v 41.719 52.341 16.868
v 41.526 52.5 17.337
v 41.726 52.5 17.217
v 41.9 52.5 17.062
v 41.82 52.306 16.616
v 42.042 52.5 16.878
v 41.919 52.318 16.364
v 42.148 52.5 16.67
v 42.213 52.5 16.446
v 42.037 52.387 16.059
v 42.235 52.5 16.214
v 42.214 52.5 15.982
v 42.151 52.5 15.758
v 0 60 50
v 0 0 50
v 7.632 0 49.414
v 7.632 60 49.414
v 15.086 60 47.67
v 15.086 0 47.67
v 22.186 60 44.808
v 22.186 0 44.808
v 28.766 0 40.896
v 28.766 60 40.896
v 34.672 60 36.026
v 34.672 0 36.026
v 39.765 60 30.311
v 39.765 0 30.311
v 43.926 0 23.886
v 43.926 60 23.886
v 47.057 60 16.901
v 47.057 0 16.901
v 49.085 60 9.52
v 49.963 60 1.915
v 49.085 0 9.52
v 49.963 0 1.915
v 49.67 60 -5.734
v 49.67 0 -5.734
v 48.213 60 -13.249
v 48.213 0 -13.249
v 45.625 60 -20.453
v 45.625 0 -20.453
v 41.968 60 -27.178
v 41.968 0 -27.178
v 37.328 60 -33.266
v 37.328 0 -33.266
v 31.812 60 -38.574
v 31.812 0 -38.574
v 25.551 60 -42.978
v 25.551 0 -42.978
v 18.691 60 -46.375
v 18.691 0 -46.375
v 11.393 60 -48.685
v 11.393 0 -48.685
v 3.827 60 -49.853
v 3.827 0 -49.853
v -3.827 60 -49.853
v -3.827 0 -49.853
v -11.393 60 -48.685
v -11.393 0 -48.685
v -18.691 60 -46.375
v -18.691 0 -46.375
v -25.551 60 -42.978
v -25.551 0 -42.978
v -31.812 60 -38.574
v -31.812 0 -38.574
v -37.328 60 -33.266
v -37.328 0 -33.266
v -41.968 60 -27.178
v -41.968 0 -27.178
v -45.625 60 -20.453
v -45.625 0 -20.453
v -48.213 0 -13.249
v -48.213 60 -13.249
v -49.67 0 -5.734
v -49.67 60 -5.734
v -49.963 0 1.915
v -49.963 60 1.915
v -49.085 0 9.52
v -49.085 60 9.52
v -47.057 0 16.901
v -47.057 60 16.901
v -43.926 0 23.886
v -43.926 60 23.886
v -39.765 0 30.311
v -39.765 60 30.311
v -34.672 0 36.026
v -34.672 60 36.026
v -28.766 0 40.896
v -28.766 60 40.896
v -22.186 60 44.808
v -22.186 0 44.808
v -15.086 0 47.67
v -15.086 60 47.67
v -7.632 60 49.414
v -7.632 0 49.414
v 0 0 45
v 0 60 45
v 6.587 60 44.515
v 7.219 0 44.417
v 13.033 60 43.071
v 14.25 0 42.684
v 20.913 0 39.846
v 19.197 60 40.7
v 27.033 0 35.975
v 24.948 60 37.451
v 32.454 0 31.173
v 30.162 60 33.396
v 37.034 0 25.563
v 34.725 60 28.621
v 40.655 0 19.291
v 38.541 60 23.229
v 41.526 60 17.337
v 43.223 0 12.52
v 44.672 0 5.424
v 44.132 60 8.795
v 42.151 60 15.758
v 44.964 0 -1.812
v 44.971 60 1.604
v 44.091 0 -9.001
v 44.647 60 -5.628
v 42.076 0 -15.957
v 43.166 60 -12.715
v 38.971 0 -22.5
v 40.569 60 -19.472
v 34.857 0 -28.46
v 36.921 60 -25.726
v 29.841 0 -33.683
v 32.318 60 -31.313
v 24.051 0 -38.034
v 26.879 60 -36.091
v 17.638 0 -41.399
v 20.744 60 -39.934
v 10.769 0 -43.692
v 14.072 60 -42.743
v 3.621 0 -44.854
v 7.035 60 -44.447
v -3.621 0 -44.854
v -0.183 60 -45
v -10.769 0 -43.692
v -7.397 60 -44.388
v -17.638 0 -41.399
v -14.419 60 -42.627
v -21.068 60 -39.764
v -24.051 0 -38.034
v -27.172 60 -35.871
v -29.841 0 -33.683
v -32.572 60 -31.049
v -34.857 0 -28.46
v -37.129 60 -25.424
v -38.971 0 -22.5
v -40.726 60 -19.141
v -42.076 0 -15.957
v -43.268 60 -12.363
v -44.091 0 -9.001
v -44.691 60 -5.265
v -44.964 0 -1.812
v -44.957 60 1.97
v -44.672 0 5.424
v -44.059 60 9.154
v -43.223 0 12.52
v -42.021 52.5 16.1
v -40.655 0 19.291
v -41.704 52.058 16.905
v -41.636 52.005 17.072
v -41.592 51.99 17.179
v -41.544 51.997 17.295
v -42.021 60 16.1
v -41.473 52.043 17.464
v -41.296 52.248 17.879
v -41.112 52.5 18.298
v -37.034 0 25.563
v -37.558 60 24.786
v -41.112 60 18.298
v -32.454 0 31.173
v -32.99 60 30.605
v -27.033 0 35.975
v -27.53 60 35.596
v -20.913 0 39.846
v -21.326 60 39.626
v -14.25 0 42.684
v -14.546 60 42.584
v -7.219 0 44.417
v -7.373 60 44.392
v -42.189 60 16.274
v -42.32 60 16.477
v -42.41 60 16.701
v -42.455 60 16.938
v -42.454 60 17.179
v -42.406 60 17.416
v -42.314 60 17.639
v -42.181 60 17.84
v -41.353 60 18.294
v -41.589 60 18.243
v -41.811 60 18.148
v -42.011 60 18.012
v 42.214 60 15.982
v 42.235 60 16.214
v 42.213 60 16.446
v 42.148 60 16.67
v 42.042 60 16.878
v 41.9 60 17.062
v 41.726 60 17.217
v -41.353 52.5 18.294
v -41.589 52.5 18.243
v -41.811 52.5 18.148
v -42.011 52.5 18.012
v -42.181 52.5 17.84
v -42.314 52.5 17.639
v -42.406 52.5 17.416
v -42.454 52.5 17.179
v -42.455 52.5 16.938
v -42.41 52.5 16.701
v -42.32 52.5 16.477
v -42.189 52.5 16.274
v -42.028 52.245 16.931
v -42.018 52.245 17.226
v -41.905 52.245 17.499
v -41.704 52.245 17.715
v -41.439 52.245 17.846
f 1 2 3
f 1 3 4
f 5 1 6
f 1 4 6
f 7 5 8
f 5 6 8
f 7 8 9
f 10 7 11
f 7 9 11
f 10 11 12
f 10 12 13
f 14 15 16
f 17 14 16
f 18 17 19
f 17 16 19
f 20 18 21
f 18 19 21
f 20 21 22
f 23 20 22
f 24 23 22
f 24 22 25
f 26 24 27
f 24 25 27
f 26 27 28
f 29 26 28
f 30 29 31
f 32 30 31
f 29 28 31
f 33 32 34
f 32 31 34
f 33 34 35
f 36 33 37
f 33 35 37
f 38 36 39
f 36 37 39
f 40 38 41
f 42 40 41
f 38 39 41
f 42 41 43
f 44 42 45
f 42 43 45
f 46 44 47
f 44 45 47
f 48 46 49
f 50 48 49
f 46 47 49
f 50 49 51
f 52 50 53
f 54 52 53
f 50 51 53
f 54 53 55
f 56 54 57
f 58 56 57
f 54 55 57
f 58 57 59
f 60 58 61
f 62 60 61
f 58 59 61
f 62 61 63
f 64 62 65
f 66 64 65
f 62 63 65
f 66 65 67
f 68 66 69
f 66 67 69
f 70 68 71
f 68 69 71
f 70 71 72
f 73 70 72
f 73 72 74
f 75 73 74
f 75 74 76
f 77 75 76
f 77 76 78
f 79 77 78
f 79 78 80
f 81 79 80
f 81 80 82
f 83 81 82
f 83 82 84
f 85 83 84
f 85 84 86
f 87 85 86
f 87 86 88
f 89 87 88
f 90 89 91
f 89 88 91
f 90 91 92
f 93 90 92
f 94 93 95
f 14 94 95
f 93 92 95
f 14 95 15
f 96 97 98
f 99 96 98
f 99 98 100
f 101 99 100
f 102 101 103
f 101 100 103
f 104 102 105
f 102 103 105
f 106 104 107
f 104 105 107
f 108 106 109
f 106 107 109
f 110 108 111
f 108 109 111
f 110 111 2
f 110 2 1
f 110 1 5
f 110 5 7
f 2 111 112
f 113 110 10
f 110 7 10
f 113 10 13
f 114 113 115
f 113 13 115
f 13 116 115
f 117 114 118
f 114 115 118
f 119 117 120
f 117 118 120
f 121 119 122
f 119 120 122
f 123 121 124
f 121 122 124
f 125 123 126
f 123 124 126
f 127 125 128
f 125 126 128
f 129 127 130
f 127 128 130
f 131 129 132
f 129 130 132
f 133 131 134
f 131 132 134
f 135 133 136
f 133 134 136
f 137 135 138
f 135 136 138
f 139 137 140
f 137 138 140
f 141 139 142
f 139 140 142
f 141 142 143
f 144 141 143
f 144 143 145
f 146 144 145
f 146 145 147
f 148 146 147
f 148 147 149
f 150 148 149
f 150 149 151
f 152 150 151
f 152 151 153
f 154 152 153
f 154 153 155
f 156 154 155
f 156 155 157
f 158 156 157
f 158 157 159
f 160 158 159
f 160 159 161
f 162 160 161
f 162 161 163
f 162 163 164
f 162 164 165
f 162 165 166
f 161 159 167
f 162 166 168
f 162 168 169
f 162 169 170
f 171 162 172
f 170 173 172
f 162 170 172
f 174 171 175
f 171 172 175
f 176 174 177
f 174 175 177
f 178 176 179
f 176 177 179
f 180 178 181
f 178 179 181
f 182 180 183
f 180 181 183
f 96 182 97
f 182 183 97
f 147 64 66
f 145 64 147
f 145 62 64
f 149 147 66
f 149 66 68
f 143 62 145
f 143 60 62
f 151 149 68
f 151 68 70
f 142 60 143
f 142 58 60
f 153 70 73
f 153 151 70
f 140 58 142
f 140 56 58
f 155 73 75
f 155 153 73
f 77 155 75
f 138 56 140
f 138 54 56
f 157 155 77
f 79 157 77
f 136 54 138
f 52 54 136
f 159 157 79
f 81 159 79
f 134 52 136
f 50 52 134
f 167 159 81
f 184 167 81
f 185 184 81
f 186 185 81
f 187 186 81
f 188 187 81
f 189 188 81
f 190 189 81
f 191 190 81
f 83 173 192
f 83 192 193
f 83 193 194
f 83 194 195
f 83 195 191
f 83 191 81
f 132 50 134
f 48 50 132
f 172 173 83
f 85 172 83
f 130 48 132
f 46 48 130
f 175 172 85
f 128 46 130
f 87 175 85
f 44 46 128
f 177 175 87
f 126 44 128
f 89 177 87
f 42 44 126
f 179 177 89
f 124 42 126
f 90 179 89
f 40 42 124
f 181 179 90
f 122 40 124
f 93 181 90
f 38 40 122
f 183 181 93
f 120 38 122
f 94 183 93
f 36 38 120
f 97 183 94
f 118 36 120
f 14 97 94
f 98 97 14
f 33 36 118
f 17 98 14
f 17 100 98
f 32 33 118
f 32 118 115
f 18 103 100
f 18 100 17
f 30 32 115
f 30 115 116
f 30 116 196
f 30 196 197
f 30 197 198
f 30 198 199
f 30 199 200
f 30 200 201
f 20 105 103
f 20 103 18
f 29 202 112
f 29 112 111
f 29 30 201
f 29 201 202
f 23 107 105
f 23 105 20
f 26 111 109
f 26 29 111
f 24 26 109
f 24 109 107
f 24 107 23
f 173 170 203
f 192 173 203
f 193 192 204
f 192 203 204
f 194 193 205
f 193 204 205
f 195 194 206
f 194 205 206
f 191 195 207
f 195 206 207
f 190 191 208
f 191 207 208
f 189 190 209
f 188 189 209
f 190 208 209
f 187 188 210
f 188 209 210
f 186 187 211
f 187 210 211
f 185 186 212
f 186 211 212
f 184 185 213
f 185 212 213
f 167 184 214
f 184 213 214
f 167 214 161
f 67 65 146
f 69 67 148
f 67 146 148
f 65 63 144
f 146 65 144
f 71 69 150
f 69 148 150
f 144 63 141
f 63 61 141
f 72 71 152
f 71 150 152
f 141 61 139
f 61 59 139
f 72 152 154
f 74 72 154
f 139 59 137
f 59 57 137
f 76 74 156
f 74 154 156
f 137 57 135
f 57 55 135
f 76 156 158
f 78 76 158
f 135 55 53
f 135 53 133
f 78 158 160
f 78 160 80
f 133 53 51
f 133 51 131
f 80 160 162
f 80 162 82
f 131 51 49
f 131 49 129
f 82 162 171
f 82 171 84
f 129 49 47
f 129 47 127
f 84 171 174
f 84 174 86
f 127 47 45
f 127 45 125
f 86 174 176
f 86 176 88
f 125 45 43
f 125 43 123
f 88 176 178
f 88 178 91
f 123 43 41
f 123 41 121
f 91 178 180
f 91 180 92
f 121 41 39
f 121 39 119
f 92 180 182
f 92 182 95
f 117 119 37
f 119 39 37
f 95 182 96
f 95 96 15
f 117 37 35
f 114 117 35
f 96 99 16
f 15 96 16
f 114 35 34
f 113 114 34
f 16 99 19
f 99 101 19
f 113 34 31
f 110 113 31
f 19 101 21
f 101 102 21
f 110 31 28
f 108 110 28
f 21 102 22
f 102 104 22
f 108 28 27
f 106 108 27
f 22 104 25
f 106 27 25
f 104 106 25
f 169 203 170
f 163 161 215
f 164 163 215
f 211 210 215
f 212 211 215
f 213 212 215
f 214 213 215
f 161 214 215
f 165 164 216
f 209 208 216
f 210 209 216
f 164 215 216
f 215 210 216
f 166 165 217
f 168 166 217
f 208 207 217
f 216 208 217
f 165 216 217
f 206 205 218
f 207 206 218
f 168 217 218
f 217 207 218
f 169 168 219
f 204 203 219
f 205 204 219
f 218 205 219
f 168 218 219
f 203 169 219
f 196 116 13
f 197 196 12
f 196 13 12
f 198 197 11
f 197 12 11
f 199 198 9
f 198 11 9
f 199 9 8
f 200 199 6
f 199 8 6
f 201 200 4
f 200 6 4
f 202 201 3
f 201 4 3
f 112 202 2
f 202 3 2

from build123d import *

# Parameters (mm, degrees)
SKETCH1_R             = 50
BOSS_EXTRUDE1_DEPTH   = 60
SKETCH2_R             = 45
CUT_EXTRUDE1_DEPTH    = 93.736184955
M3_TAPPED_HOLE2_D     = 2.5
M3_TAPPED_HOLE2_DEPTH = 7.5
M3_TAPPED_HOLE2_TIP   = 0.751075774


with BuildPart() as part:
    # Sketch1 → Boss-Extrude1 (new body)
    with BuildSketch(Plane(origin=(0, 0, 0), x_dir=(1, 0, 0), z_dir=(0, 1, 0))):
        with Locations(Location((0, 0, 0), (0, 0, 270))):
            Circle(SKETCH1_R)
    extrude(amount=BOSS_EXTRUDE1_DEPTH)

    # Sketch2 → Cut-Extrude1 (cut, through all)
    with BuildSketch(Plane(origin=(0, 60, 0), x_dir=(1, 0, 0), z_dir=(0, 1, 0))):
        with Locations(Location((0, 0, 0), (0, 0, 270))):
            Circle(SKETCH2_R)
    extrude(amount=-CUT_EXTRUDE1_DEPTH, mode=Mode.SUBTRACT)

    # M3 Tapped Hole2
    with Locations(Plane(origin=(-125, 60, -260), x_dir=(-1, 0, 0), z_dir=(0, 1, 0))):
        with Locations((-125.588729382, 346.343542242), (-83.789316087, 277.051897383), (-165.985477802, 276.210298458), (165.689643288, 275.872555658), (83.529497195, 276.252926704), (125.273893117, 347.014910337)):
            Hole(M3_TAPPED_HOLE2_D / 2, depth=M3_TAPPED_HOLE2_DEPTH)
            with Locations((0, 0, -(M3_TAPPED_HOLE2_DEPTH + M3_TAPPED_HOLE2_TIP / 2))):  # 118° drill point
                Cone(0, M3_TAPPED_HOLE2_D / 2, M3_TAPPED_HOLE2_TIP, mode=Mode.SUBTRACT)


solid = part.part
